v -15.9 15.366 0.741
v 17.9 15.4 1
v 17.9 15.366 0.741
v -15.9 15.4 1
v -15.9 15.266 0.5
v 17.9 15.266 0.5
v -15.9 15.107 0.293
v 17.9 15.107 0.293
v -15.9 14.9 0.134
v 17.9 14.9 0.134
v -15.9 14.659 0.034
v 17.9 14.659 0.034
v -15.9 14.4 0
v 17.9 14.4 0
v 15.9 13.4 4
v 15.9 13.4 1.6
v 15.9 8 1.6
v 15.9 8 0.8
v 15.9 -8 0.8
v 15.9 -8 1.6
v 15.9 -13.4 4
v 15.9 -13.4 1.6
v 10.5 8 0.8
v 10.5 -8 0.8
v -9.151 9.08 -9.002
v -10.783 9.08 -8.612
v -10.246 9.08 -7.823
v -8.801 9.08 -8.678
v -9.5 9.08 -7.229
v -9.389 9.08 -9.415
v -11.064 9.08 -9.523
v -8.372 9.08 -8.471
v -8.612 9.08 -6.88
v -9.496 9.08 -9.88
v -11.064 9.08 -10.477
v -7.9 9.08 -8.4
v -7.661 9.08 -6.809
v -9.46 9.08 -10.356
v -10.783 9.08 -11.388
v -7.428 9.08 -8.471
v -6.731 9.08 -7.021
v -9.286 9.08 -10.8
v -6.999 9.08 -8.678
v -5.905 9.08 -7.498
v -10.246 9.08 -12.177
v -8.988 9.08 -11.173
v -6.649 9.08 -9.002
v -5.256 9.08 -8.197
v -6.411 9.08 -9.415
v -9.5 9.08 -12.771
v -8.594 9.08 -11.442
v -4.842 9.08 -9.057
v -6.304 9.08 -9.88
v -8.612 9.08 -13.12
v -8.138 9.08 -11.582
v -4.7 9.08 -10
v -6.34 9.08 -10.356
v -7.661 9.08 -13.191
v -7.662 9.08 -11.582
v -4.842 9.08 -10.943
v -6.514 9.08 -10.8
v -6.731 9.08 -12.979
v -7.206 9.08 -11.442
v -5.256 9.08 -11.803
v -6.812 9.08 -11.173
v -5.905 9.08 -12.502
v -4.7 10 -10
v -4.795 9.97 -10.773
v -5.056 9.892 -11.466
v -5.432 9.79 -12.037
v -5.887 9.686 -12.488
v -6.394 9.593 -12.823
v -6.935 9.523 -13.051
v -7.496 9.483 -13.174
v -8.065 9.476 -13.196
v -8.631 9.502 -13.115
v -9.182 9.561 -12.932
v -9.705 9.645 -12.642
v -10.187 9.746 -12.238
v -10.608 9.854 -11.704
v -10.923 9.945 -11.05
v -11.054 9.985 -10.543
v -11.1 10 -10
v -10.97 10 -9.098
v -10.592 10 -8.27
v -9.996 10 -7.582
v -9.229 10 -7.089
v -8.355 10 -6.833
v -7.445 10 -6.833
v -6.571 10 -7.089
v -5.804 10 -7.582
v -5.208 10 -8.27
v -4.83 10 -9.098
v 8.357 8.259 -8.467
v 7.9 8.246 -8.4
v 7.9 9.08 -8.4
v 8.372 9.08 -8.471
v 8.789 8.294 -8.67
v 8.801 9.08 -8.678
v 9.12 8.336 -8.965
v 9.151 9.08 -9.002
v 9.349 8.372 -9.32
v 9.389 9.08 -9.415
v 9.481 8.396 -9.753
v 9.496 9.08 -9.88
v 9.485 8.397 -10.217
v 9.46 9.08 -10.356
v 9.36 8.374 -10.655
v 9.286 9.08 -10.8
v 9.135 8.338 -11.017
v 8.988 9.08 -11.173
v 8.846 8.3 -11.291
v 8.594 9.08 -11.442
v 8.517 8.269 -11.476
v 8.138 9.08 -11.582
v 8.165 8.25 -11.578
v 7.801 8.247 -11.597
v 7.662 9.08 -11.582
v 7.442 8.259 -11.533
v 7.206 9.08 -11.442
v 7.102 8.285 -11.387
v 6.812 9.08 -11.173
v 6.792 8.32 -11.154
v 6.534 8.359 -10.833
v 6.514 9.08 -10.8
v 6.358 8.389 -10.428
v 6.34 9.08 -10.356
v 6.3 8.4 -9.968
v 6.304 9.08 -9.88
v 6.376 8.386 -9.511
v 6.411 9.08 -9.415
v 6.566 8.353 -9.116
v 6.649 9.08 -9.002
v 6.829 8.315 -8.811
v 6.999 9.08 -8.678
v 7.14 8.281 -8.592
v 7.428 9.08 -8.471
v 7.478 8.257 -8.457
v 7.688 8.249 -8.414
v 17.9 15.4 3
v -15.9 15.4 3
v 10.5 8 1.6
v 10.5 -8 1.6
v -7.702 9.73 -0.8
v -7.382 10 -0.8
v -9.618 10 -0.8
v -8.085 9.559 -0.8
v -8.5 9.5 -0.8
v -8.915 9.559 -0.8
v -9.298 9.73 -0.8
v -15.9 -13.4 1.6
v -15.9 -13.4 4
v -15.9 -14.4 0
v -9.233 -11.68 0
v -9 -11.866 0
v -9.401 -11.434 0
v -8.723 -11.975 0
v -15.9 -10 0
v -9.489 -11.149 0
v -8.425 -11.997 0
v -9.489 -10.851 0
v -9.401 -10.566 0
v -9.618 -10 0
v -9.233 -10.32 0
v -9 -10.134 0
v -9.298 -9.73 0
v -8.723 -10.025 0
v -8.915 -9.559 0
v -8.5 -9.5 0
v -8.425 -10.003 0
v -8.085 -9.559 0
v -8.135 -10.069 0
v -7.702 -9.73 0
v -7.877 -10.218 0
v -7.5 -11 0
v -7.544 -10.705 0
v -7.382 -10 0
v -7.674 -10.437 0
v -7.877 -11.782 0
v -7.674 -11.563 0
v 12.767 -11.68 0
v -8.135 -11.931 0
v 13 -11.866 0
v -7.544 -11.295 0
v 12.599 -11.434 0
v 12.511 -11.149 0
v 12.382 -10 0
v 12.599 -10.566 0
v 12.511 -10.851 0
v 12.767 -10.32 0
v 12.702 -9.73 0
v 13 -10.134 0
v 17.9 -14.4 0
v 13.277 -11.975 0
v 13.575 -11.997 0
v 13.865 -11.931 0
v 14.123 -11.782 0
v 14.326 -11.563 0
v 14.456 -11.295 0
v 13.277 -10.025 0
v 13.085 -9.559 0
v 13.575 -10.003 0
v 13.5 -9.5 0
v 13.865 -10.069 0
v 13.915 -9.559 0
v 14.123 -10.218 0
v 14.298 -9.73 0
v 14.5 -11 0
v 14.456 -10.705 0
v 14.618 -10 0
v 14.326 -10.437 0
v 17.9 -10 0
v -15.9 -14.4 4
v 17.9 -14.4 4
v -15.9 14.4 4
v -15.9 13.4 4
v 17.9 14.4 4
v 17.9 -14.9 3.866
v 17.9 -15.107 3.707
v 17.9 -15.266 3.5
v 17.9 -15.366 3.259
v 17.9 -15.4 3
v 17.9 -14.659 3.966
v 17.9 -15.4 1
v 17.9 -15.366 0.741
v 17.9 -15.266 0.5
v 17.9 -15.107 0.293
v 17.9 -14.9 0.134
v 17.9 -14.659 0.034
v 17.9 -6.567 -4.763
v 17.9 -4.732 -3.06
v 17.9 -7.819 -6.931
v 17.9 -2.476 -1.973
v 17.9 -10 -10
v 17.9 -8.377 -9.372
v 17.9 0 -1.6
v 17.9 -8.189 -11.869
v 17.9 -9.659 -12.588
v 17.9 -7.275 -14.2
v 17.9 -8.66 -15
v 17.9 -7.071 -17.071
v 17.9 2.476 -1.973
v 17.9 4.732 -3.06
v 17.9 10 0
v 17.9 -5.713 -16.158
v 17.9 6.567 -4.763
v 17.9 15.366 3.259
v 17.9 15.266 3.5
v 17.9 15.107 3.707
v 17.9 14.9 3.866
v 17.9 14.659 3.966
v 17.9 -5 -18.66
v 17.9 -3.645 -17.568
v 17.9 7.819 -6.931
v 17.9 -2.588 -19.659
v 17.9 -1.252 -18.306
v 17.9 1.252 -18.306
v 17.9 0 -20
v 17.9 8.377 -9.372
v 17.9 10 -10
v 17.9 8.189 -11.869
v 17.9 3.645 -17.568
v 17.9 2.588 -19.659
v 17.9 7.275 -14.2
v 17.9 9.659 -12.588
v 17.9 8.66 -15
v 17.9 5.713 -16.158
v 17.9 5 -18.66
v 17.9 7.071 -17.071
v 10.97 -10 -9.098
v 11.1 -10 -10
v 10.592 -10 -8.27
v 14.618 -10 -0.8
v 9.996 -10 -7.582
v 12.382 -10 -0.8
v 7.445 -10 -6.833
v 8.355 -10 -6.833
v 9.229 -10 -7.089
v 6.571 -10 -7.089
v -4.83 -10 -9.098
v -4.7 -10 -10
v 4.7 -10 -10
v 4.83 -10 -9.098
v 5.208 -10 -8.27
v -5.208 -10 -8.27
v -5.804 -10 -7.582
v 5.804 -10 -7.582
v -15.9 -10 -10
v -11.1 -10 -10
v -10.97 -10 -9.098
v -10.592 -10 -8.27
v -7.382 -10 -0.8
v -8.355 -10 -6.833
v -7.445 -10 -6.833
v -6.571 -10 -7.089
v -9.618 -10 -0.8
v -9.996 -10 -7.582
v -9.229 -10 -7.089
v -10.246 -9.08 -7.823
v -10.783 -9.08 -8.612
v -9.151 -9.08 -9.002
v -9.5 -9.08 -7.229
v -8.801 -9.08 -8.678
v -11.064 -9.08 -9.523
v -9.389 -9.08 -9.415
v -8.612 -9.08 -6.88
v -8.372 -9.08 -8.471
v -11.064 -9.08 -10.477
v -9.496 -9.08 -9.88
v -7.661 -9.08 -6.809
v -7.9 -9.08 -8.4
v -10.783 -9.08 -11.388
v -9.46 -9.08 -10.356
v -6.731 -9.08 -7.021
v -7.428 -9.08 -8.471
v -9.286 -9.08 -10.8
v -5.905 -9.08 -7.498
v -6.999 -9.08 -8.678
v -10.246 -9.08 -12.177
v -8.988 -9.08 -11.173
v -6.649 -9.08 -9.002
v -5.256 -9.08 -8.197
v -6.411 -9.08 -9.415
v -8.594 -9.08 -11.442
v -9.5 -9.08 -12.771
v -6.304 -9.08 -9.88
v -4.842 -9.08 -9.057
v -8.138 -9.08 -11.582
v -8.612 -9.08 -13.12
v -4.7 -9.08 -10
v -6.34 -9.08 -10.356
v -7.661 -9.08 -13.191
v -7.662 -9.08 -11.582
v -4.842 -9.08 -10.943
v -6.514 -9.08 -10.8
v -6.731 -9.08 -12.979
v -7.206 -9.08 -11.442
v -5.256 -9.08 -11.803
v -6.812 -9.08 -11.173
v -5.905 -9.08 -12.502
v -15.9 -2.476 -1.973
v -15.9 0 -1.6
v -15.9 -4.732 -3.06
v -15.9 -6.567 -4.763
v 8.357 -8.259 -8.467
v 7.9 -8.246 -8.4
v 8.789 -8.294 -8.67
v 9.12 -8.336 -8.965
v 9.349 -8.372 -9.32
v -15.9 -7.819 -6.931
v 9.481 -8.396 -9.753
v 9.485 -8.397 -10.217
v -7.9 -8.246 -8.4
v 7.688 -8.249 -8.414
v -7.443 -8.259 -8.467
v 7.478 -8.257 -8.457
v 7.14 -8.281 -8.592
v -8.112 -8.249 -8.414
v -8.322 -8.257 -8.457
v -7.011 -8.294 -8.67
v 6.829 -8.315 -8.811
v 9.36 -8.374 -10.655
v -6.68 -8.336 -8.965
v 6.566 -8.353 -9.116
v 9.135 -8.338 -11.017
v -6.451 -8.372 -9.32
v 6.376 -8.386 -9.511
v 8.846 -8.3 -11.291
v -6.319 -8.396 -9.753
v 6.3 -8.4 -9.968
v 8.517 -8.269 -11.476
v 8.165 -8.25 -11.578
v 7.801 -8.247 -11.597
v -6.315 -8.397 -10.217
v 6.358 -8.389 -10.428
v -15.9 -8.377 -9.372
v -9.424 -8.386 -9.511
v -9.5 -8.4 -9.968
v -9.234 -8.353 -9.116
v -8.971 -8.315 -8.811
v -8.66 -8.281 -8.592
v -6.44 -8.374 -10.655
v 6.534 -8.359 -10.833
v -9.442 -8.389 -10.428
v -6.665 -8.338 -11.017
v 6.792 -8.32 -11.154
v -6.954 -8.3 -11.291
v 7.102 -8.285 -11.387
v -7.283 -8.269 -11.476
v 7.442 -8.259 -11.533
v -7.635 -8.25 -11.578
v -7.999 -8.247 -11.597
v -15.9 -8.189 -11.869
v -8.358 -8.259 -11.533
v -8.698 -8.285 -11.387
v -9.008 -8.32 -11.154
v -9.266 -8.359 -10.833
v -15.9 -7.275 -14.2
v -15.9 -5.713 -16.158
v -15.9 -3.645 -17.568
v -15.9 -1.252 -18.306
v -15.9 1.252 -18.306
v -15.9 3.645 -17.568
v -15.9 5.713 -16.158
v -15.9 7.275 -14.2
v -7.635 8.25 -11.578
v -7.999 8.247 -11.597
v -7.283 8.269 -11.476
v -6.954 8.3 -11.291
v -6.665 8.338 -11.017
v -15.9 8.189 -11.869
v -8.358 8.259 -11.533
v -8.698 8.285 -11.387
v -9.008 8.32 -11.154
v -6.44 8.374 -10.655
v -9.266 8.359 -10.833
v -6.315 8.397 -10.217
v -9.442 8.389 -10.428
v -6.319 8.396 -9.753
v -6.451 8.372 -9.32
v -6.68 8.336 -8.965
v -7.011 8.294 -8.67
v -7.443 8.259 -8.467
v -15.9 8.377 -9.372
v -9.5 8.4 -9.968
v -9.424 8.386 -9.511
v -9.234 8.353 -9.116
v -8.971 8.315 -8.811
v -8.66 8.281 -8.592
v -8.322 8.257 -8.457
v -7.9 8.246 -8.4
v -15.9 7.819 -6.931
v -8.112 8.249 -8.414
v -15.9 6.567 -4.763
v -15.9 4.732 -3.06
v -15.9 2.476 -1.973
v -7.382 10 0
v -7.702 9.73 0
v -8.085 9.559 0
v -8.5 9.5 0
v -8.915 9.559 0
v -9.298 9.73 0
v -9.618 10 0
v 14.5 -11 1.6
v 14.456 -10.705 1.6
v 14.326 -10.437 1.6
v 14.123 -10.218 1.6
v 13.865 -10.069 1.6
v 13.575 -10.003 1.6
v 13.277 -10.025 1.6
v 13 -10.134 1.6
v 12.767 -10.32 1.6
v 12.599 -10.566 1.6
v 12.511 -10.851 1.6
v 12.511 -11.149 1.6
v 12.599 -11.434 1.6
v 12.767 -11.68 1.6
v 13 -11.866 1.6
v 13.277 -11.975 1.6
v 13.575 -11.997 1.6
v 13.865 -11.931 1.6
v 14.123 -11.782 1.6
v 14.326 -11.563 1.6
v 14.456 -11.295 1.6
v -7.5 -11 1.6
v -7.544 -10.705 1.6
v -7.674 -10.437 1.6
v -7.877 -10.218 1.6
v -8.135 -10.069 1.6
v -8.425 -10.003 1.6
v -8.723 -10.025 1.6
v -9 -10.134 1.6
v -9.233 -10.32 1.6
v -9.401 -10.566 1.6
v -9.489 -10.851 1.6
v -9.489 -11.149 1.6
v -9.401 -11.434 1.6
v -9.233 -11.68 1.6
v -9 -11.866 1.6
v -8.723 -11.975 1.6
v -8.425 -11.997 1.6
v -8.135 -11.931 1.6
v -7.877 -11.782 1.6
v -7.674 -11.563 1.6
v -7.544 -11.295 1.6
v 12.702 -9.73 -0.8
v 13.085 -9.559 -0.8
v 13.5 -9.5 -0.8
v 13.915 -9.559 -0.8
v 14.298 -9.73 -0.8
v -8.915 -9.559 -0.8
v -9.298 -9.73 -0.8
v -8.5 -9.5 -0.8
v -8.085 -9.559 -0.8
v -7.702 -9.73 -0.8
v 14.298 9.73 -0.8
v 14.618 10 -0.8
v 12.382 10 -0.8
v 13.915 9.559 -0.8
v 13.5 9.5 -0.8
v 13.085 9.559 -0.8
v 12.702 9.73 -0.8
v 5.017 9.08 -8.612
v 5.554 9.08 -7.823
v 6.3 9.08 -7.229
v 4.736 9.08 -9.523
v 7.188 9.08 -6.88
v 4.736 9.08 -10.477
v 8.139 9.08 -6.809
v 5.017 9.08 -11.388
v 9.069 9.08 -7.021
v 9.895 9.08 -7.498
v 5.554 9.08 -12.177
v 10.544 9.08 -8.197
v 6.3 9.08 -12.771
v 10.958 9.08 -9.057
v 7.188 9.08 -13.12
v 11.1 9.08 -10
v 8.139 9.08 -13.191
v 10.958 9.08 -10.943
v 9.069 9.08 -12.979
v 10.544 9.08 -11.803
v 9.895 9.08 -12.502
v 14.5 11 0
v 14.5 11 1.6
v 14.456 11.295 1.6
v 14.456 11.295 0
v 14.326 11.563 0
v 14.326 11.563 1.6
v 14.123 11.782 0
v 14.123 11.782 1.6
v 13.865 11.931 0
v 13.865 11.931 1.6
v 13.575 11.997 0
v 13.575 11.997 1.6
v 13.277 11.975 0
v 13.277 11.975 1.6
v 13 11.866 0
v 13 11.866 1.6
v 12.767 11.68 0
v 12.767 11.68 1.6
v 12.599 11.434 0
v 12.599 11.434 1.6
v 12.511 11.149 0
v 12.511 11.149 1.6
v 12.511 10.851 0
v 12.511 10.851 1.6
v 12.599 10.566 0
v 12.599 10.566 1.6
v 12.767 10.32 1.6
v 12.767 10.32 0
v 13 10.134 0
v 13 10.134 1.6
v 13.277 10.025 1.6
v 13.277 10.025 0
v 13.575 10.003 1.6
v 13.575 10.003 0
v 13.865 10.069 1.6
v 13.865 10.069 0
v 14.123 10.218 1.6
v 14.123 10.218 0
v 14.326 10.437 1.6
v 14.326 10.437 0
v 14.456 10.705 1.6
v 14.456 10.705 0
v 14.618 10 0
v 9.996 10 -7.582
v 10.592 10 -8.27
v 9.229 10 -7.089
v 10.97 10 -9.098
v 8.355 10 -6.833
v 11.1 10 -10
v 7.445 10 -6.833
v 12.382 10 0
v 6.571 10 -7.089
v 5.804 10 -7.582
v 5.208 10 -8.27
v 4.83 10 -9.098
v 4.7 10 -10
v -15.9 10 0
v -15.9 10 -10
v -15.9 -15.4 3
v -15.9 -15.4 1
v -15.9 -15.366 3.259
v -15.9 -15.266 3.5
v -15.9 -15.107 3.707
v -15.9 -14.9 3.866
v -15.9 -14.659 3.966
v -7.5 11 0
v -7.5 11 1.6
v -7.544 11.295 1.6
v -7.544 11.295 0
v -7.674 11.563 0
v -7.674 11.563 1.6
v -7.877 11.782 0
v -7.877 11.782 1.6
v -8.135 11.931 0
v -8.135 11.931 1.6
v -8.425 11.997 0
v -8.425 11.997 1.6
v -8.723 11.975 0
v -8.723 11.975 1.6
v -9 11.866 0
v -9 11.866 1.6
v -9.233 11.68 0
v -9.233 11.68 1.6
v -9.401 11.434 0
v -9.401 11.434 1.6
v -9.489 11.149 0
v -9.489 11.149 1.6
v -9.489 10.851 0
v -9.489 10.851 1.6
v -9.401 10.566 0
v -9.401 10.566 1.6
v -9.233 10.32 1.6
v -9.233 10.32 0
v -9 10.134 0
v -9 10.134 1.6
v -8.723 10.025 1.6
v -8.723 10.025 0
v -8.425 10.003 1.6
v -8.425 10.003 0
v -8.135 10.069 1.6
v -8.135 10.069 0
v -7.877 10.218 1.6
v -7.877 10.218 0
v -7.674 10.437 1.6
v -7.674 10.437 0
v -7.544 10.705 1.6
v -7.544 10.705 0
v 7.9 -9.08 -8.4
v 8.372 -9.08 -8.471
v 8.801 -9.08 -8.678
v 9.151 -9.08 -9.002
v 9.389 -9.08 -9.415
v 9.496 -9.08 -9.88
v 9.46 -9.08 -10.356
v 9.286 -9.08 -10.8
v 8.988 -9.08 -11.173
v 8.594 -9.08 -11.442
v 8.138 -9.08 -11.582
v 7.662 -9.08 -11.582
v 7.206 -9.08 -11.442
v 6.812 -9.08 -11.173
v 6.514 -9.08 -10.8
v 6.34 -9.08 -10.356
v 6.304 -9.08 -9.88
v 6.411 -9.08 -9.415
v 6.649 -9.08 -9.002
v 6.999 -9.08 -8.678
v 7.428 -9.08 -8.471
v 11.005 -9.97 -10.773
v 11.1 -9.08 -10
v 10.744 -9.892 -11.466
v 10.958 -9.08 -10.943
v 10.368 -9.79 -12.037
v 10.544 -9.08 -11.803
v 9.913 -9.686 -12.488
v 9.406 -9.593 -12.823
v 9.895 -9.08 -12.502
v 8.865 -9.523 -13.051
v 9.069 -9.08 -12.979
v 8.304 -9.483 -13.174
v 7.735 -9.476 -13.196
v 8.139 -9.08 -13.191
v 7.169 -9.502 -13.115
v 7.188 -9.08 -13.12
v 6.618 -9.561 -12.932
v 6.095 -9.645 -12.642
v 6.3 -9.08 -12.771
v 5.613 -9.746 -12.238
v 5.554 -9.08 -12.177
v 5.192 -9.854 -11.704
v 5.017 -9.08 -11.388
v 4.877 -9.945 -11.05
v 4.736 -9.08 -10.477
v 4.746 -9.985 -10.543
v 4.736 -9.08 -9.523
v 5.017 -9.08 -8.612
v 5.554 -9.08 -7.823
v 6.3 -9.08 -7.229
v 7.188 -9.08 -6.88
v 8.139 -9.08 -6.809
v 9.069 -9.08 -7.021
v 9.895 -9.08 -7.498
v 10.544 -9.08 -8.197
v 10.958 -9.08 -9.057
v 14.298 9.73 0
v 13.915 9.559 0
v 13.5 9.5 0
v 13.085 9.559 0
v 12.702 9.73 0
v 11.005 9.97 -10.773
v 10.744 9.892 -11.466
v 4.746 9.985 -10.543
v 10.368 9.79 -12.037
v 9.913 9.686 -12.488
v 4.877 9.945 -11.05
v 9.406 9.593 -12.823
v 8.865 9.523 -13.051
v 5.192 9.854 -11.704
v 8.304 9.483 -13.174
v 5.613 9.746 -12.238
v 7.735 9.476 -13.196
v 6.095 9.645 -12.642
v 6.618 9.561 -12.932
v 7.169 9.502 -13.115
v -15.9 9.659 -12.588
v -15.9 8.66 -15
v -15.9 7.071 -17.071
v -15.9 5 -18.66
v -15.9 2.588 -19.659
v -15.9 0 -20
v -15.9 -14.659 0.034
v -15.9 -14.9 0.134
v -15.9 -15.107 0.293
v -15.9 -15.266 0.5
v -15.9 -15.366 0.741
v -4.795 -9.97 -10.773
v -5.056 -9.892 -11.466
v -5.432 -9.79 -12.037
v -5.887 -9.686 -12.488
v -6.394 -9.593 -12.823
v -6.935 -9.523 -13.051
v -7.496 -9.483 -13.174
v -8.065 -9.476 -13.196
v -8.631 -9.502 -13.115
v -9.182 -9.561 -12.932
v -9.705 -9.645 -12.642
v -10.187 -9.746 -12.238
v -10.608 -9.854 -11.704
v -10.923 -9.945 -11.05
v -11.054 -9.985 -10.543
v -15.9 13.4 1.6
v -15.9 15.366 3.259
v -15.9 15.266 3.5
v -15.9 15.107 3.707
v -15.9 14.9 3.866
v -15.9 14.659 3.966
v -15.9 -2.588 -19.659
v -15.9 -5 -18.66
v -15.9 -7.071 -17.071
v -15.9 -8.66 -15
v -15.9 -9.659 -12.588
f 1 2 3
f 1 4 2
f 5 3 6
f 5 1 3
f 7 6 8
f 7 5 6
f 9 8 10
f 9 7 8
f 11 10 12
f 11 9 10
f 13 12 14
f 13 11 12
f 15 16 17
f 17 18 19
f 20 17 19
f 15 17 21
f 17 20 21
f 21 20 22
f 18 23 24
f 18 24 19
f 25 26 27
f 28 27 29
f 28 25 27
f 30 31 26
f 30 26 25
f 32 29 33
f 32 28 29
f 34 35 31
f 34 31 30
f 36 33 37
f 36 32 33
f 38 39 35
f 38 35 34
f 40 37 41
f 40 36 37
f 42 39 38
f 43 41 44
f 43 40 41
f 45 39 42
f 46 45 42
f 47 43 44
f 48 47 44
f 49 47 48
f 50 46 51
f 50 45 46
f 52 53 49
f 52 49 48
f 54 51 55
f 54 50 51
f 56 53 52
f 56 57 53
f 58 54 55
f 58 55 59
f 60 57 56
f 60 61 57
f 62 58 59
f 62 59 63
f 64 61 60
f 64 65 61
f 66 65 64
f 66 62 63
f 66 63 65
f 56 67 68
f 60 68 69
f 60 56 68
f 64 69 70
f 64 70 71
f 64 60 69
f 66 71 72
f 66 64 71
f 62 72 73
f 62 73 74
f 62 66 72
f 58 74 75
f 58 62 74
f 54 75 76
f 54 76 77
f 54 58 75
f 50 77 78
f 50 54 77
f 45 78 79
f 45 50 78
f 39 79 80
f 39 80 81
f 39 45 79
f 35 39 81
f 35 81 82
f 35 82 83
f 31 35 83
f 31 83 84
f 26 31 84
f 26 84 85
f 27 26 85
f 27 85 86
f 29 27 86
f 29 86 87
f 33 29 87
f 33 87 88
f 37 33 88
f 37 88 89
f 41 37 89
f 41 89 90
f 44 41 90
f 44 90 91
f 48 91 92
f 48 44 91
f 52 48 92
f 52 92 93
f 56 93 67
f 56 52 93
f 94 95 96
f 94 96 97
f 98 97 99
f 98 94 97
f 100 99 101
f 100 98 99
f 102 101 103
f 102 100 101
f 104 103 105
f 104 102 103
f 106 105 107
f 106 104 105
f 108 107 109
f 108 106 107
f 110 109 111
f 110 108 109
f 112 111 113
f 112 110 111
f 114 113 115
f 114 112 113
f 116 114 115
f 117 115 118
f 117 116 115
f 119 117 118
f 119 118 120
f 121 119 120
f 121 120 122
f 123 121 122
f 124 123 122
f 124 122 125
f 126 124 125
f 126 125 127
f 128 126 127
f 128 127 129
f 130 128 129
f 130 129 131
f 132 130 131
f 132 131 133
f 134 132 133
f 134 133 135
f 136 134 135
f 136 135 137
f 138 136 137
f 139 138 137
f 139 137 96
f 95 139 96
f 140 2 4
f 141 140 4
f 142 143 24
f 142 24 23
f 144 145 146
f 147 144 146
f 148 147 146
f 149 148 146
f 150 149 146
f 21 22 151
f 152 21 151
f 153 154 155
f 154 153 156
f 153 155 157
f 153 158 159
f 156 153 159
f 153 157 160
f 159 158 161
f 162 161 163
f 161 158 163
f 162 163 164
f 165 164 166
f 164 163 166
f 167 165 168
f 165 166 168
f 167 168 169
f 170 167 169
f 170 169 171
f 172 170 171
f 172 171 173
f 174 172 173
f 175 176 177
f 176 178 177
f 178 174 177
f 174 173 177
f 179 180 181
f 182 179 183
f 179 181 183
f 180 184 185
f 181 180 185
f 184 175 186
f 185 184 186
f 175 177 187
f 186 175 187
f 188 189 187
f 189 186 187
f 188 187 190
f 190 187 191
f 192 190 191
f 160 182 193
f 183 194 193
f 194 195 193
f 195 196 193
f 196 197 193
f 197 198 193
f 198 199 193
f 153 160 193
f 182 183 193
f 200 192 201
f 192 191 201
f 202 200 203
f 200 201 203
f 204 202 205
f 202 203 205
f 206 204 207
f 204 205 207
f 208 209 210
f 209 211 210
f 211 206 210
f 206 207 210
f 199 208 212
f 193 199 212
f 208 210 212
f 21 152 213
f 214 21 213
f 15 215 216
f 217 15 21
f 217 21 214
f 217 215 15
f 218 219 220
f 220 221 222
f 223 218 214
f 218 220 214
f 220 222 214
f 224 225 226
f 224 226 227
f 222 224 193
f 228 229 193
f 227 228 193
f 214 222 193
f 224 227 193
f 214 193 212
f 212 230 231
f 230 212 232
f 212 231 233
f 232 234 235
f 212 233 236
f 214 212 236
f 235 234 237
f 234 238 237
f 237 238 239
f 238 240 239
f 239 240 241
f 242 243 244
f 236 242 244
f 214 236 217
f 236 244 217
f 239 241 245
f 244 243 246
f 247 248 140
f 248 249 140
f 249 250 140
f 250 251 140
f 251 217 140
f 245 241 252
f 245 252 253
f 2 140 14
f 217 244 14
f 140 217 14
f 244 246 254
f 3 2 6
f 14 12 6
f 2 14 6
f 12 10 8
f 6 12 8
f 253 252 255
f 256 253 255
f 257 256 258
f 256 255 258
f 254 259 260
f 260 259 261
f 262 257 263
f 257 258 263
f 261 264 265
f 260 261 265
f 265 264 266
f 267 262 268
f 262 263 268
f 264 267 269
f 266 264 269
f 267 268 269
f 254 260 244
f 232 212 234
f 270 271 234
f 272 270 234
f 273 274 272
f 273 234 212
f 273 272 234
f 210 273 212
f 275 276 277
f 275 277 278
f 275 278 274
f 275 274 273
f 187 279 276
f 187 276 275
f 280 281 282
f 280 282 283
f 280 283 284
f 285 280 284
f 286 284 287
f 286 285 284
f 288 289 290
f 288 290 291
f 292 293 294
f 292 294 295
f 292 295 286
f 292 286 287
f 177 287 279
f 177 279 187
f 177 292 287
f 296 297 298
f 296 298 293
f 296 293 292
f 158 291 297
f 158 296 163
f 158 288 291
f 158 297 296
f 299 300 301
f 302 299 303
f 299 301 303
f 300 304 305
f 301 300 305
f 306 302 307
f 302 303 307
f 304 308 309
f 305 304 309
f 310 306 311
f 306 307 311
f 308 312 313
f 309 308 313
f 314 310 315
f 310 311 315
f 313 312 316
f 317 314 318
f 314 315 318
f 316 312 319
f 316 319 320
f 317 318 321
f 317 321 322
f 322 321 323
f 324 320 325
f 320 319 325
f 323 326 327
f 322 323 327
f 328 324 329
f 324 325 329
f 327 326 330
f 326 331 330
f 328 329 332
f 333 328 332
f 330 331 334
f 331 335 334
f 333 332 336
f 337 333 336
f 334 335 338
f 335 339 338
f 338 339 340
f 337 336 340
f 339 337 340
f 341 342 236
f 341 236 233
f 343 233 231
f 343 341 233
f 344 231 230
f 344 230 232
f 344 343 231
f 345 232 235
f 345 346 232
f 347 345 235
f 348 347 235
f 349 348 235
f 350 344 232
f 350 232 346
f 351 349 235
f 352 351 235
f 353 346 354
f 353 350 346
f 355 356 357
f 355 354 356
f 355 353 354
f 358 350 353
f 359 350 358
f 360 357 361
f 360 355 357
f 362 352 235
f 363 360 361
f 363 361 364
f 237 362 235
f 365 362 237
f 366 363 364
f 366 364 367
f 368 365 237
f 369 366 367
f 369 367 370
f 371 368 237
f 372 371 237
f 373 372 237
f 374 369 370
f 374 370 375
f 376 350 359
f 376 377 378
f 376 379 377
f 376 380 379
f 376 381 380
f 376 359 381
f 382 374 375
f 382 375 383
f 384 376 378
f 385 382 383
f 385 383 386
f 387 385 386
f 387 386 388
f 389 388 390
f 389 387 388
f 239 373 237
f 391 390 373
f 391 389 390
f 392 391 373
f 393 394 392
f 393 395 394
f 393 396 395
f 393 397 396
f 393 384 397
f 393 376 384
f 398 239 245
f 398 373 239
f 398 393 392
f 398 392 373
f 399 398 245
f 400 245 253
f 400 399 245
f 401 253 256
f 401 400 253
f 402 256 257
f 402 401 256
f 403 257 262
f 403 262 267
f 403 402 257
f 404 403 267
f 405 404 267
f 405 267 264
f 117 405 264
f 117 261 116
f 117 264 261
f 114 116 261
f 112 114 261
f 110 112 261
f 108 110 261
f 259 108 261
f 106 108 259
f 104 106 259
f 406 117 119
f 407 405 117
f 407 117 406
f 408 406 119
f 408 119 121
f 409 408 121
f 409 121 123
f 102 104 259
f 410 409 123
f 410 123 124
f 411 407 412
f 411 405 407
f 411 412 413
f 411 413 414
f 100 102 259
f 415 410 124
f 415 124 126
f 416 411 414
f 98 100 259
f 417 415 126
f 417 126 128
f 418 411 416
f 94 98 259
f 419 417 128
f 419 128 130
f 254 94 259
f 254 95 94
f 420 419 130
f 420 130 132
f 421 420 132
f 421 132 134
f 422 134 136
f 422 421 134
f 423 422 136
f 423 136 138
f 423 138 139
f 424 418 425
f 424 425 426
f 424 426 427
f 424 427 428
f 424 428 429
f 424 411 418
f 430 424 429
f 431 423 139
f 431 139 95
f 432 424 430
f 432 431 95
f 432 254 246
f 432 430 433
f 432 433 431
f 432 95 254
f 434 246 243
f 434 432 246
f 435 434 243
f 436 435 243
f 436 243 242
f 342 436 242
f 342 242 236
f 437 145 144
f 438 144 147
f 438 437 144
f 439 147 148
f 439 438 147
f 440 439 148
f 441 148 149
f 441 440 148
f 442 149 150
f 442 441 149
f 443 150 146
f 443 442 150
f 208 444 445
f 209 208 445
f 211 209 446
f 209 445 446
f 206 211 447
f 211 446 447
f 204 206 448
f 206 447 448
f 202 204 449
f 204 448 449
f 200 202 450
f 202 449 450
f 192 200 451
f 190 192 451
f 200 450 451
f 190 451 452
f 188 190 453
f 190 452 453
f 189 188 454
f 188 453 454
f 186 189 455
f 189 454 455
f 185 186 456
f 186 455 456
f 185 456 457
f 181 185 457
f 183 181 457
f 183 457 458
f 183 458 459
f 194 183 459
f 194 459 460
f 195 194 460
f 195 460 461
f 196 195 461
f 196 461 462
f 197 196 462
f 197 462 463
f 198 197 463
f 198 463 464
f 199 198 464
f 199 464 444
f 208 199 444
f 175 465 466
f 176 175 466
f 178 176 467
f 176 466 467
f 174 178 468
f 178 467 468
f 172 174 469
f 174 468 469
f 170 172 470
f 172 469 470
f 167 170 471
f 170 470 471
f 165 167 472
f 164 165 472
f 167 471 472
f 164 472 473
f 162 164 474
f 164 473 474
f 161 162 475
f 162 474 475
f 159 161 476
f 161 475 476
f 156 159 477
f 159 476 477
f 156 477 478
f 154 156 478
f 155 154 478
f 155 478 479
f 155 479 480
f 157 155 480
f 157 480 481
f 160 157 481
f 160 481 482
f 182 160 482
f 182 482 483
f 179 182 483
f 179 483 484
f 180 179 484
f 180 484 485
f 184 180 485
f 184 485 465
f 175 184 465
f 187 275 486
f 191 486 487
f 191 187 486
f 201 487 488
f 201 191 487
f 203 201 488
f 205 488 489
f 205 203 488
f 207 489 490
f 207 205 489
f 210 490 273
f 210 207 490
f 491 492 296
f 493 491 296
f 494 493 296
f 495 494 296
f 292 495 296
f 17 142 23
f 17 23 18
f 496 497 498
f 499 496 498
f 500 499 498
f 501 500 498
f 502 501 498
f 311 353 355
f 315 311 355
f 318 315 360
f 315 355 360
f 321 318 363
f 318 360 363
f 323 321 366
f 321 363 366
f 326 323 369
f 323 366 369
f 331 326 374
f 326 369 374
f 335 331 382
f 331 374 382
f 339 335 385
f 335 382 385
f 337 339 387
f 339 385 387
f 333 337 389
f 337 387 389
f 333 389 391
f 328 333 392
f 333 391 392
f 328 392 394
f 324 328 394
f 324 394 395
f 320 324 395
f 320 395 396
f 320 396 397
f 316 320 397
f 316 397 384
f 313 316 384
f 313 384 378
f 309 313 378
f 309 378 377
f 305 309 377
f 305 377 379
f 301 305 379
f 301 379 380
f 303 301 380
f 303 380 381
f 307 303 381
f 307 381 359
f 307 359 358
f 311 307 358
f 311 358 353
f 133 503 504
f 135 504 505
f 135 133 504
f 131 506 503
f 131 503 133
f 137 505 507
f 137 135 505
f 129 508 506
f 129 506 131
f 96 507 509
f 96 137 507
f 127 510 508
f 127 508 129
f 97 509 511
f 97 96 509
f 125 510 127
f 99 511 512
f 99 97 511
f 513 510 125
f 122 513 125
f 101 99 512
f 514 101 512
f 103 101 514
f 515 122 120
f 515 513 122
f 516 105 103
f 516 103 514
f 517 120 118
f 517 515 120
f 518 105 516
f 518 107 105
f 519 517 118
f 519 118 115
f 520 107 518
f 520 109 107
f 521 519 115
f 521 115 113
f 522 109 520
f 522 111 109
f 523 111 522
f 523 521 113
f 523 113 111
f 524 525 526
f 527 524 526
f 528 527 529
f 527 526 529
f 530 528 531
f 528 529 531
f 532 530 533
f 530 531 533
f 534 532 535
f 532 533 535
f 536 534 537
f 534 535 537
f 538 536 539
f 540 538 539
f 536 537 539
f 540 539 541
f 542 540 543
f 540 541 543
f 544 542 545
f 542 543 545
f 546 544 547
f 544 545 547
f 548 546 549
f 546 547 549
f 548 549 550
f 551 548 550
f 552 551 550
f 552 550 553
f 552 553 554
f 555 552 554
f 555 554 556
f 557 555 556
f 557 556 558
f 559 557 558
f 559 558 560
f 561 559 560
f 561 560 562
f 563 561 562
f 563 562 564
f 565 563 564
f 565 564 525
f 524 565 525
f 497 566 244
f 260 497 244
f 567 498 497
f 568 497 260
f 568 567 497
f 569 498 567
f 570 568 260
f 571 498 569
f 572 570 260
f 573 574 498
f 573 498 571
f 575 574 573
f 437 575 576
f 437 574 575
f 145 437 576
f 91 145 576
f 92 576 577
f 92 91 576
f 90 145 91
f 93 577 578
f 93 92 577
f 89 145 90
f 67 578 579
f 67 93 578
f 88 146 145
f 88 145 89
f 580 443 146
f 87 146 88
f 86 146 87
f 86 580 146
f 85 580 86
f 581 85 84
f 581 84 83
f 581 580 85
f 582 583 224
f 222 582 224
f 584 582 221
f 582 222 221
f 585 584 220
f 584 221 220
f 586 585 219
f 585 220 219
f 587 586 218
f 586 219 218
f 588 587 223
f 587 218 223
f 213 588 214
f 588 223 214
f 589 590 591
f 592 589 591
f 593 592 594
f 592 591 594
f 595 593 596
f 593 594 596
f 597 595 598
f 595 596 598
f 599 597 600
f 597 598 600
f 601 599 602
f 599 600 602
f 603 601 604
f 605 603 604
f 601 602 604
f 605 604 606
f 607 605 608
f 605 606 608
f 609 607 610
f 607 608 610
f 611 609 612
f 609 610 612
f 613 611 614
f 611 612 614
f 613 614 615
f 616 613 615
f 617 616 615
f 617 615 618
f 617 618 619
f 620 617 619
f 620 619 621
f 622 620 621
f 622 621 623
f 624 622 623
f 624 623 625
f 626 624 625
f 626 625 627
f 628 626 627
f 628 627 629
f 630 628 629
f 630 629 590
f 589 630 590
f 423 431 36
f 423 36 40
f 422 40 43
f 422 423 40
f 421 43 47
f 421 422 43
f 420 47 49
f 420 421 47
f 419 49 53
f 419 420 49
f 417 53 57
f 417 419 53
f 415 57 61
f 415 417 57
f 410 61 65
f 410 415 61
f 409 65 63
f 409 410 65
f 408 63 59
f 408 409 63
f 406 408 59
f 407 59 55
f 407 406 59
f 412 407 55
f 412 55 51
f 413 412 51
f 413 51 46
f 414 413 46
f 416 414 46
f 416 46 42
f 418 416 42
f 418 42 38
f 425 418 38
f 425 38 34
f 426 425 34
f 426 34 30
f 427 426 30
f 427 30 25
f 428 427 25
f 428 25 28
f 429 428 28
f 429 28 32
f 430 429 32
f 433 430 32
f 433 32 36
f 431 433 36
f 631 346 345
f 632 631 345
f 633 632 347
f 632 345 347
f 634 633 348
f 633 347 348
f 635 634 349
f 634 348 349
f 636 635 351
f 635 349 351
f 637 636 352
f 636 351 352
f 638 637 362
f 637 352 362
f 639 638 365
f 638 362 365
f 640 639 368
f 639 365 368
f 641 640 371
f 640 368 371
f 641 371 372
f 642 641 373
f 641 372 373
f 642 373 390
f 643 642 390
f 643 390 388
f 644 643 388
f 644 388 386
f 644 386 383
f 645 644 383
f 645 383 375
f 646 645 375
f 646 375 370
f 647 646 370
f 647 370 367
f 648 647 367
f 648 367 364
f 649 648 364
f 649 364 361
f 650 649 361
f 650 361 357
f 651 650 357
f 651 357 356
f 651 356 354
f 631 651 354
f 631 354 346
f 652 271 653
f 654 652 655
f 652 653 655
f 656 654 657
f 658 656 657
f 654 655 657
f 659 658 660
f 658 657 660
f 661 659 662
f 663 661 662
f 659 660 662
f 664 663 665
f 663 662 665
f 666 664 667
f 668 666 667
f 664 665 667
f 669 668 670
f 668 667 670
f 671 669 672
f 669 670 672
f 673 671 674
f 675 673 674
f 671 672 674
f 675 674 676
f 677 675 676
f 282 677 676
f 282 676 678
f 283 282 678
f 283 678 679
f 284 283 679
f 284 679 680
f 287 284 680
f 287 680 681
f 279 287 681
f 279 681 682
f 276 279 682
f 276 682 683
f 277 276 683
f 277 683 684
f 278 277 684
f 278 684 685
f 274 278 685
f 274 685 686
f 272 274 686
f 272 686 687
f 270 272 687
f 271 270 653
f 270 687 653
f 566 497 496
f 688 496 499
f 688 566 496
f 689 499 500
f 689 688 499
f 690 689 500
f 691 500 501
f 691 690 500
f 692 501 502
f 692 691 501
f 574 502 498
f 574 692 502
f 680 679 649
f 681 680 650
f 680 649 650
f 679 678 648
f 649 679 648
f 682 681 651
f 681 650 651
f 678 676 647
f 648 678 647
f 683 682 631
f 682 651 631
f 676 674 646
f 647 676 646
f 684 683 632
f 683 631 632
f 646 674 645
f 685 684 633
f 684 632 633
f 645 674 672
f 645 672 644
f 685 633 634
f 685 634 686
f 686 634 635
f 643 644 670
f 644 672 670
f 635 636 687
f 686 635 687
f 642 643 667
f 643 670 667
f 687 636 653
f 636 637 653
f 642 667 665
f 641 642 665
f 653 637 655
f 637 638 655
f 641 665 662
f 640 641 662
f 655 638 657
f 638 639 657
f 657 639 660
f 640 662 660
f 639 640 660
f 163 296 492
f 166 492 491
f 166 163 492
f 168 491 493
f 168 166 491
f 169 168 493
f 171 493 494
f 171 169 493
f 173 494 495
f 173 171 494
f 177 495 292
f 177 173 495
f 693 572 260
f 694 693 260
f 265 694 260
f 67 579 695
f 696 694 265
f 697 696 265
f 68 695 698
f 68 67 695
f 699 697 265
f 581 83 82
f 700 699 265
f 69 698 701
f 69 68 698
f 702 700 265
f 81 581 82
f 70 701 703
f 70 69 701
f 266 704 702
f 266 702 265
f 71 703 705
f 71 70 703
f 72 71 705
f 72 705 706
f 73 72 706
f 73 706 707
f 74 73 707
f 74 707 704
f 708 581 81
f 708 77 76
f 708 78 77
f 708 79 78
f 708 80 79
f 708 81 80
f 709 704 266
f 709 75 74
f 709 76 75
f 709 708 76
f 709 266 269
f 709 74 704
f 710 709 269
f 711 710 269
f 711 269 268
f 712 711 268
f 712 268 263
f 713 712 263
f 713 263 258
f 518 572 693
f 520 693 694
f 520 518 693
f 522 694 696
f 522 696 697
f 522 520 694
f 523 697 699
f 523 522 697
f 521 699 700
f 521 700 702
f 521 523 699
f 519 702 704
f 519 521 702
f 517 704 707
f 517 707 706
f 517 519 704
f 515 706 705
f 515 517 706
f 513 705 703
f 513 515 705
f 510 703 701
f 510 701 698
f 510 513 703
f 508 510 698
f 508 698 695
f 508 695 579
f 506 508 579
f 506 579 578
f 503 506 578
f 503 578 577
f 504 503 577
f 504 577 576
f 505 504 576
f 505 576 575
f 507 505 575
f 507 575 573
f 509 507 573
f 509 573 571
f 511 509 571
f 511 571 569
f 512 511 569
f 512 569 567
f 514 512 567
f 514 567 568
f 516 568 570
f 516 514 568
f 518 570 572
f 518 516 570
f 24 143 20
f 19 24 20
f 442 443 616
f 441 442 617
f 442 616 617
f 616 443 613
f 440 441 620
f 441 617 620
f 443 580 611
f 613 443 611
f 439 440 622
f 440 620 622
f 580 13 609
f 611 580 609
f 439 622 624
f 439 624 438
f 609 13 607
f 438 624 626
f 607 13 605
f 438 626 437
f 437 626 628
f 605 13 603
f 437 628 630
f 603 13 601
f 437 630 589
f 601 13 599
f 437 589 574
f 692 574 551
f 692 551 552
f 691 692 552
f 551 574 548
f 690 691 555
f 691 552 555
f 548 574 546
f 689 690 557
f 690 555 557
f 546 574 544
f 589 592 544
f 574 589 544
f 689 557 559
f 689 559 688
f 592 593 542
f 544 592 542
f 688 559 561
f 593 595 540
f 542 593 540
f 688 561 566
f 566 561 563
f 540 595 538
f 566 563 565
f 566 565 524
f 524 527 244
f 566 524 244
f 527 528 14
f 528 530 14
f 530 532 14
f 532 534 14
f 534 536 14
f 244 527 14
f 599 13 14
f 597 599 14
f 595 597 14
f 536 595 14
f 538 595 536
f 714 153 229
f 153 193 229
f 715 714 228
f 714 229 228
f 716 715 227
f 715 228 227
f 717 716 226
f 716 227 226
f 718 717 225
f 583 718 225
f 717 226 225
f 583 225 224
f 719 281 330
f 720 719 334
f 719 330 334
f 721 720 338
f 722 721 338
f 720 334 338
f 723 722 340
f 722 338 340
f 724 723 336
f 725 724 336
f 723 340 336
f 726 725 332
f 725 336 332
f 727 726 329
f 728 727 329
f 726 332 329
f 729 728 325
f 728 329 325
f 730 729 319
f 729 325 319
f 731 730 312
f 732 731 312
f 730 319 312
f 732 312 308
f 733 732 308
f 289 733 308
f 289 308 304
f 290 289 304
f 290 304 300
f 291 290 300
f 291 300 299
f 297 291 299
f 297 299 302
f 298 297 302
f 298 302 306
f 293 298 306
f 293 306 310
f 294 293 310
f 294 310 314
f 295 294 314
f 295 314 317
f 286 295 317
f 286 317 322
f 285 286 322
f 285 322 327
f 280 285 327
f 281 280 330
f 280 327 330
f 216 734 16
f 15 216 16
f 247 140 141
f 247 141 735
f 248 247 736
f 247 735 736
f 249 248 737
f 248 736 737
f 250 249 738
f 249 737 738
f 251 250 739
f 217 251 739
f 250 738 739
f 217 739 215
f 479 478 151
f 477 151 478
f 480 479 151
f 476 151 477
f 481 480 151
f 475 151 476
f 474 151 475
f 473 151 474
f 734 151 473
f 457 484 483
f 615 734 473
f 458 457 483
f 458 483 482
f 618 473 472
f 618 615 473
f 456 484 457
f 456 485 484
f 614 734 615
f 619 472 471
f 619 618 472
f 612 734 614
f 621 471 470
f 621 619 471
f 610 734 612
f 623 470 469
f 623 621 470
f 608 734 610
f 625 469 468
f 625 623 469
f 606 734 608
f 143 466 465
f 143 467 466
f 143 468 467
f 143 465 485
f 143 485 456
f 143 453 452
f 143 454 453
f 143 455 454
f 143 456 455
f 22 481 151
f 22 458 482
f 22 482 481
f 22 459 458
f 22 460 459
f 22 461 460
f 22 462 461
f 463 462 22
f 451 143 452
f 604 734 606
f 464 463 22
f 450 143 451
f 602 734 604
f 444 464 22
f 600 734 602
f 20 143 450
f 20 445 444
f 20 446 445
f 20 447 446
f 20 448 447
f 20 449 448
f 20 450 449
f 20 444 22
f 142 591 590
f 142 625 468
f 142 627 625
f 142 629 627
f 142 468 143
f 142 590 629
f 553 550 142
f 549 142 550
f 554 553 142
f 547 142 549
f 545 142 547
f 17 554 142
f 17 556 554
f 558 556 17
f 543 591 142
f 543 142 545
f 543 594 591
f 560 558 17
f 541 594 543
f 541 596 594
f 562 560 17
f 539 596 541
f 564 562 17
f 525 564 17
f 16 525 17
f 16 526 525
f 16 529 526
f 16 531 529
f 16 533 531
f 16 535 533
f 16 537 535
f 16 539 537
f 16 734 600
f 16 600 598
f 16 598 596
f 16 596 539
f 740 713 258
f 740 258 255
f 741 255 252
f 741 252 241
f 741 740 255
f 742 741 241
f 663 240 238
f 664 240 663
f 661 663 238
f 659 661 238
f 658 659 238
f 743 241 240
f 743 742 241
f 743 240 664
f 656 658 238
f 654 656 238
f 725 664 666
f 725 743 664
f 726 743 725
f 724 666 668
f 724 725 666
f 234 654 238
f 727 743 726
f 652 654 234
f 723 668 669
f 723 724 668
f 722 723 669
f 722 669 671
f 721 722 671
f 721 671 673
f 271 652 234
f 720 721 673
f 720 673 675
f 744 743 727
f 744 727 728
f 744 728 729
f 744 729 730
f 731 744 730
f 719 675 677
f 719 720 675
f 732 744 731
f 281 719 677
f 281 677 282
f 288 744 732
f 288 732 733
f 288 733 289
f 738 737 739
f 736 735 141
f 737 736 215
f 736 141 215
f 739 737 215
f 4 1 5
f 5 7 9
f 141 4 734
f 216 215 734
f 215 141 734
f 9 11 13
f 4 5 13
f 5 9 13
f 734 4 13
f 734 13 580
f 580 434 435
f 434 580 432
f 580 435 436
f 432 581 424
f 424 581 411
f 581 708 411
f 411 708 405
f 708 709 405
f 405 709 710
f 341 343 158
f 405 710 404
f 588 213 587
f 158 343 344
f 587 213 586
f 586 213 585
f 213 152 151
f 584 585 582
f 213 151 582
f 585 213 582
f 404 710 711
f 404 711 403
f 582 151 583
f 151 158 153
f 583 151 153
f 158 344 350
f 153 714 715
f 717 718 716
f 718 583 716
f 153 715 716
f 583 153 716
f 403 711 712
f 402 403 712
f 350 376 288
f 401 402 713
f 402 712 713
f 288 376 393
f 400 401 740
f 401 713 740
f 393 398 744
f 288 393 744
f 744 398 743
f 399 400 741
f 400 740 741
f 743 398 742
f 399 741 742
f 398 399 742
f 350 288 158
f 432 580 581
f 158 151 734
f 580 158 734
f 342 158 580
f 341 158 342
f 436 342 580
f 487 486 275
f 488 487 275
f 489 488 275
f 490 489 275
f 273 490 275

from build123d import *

# Parameters (mm, degrees)
SKETCH_1_W               = 31.8
SKETCH_1_H               = 26.8
SKETCH_1_R               = 1
EXTRUDE_1_DEPTH          = 1.6
EXTRUDE_2_DEPTH          = 4
SKETCH_2_W               = 5.4
SKETCH_2_H               = 16
CUT_EXTRUDE_1_DEPTH      = 0.8
EXTRUDE_3_DEPTH          = 33.8
SKETCH_4_R               = 1.6
CUT_EXTRUDE_2_DEPTH      = 31.944627967
CUT_EXTRUDE_2_DEPTH_BACK = 31.944627967
CUT_EXTRUDE_START        = -1
SKETCH_6_R               = 3.2
SKETCH_6_R_2             = 1.6
CUT_EXTRUDE_3_DEPTH      = 3
CUT_EXTRUDE_START_2      = 1.6
SKETCH_1_5_R             = 1
CUT_EXTRUDE_5_DEPTH      = 33.544628089
FILLET_1_R               = 1
SKETCH_7_R               = 1.5
SKETCH_7_R_2             = 1
CUT_EXTRUDE_6_DEPTH      = 0.8


with BuildPart() as part:
    # Эскиз1 → Бобышка-Вытянуть1 (new body)
    with BuildSketch(Plane.XY):
        Rectangle(SKETCH_1_W, SKETCH_1_H)
        with Locations((-8.5, -11)):
            Circle(SKETCH_1_R, mode=Mode.SUBTRACT)
        with Locations((-8.5, 11)):
            Circle(SKETCH_1_R, mode=Mode.SUBTRACT)
        with Locations((13.5, 11)):
            Circle(SKETCH_1_R, mode=Mode.SUBTRACT)
        with Locations((13.5, -11)):
            Circle(SKETCH_1_R, mode=Mode.SUBTRACT)
        with Locations((-8.5, 11)):
            Circle(SKETCH_1_R)
        with Locations((13.5, 11)):
            Circle(SKETCH_1_R)
        with Locations((-8.5, -11)):
            Circle(SKETCH_1_R)
        with Locations((13.5, -11)):
            Circle(SKETCH_1_R)
    extrude(amount=EXTRUDE_1_DEPTH)

    # Эскиз1<3> → Бобышка-Вытянуть2 (add)
    with BuildSketch(Plane.XY):
        Polygon((-15.9, -13.4), (-15.9, -15.4), (17.9, -15.4), (17.9, 15.4), (-15.9, 15.4), (-15.9, 13.4), (15.9, 13.4), (15.9, -13.4), align=None)
    extrude(amount=EXTRUDE_2_DEPTH)

    # Эскиз2 → Вырез-Вытянуть1 (cut)
    with BuildSketch(Plane.XY.offset(1.6)):
        with Locations((13.2, 0)):
            Rectangle(SKETCH_2_W, SKETCH_2_H)
    extrude(amount=-CUT_EXTRUDE_1_DEPTH, mode=Mode.SUBTRACT)

    # Эскиз3 → Бобышка-Вытянуть3 (add)
    with BuildSketch(Plane.ZY.offset(15.9)):
        with BuildLine():
            Line((-1.6, 0), (0, 0))
            ThreePointArc((0, 0), (-2.928932188, 7.071067812), (-10, 10))
            ThreePointArc((-10, 10), (-17.071067812, 7.071067812), (-20, 0))
            Line((-20, 0), (-18.4, 0))
            ThreePointArc((-18.4, 0), (-10, 8.4), (-1.6, 0))
        make_face()
        with BuildLine():
            ThreePointArc((-10, -10), (-2.928932188, -7.071067812), (0, 0))
            Line((0, 0), (-1.6, 0))
            ThreePointArc((-1.6, 0), (-10, -8.4), (-18.4, 0))
            Line((-18.4, 0), (-20, 0))
            ThreePointArc((-20, 0), (-17.071067812, -7.071067812), (-10, -10))
        make_face()
        with BuildLine():
            Line((0, -10), (0, 0))
            ThreePointArc((0, 0), (-2.928932188, -7.071067812), (-10, -10))
            Line((-10, -10), (0, -10))
        make_face()
        with BuildLine():
            ThreePointArc((-10, 10), (-2.928932188, 7.071067812), (0, 0))
            Line((0, 0), (0, 10))
            Line((0, 10), (-10, 10))
        make_face()
    extrude(amount=-EXTRUDE_3_DEPTH)

    # Эскиз4 → Вырез-Вытянуть2 (cut, two sides)
    with BuildSketch(Plane(origin=(0, 0, 0), x_dir=(1, 0, 0), z_dir=(0, 1, 0))) as cut_extrude_2_sk:
        with Locations(Location((-7.9, 10, 0), (0, 0, 270))):
            Circle(SKETCH_4_R)
        with Locations(Location((7.9, 10, 0), (0, 0, 270))):
            Circle(SKETCH_4_R)
    extrude(amount=CUT_EXTRUDE_2_DEPTH, mode=Mode.SUBTRACT)
    extrude(cut_extrude_2_sk.sketch, amount=-CUT_EXTRUDE_2_DEPTH_BACK, mode=Mode.SUBTRACT)

    # Эскиз6 → Вырез-Вытянуть3 (cut)
    with BuildSketch(Plane(origin=(0, 10.08, 0), x_dir=(1, 0, 0), z_dir=(0, 1, 0)).offset(CUT_EXTRUDE_START)):
        with Locations((7.9, 10)):
            Circle(SKETCH_6_R)
        with Locations(Location((7.9, 10, 0), (0, 0, 270))):
            Circle(SKETCH_6_R_2, mode=Mode.SUBTRACT)
        with Locations((-7.9, 10)):
            Circle(SKETCH_6_R)
        with Locations(Location((-7.9, 10, 0), (0, 0, 270))):
            Circle(SKETCH_6_R_2, mode=Mode.SUBTRACT)
    cut_extrude_3 = extrude(amount=CUT_EXTRUDE_3_DEPTH, mode=Mode.SUBTRACT)

    # Зеркальное отражение1: Вырез-Вытянуть3 across plane
    add(cut_extrude_3.mirror(Plane.ZX), mode=Mode.SUBTRACT)

    # Эскиз1<5> → Вырез-Вытянуть5 (cut, through all)
    with BuildSketch(Plane.XY.offset(CUT_EXTRUDE_START_2)):
        with Locations((13.5, 11)):
            Circle(SKETCH_1_5_R)
        with Locations((-8.5, 11)):
            Circle(SKETCH_1_5_R)
        with Locations((-8.5, -11)):
            Circle(SKETCH_1_5_R)
        with Locations((13.5, -11)):
            Circle(SKETCH_1_5_R)
    extrude(amount=-CUT_EXTRUDE_5_DEPTH, mode=Mode.SUBTRACT)

    # Скругление1
    fillet_1_edges = [part.edges().sort_by_distance(p)[0] for p in [
        (1, -15.4, 0),
        (1, 15.4, 4),
        (1, -15.4, 4),
        (1, 15.4, 0),
    ]]
    fillet(fillet_1_edges, radius=FILLET_1_R)

    # Эскиз7 → Вырез-Вытянуть6 (cut)
    with BuildSketch(Plane(origin=(0, 0, 0), x_dir=(-1, 0, 0), z_dir=(0, 0, -1))):
        with Locations((8.5, 11)):
            Circle(SKETCH_7_R)
        with Locations(Location((8.5, 11, 0), (0, 0, 180))):
            Circle(SKETCH_7_R_2, mode=Mode.SUBTRACT)
        with Locations((-13.5, 11)):
            Circle(SKETCH_7_R)
        with Locations(Location((-13.5, 11, 0), (0, 0, 180))):
            Circle(SKETCH_7_R_2, mode=Mode.SUBTRACT)
        with Locations((8.5, -11)):
            Circle(SKETCH_7_R)
        with Locations(Location((8.5, -11, 0), (0, 0, 180))):
            Circle(SKETCH_7_R_2, mode=Mode.SUBTRACT)
        with Locations((-13.5, -11)):
            Circle(SKETCH_7_R)
        with Locations(Location((-13.5, -11, 0), (0, 0, 180))):
            Circle(SKETCH_7_R_2, mode=Mode.SUBTRACT)
    extrude(amount=CUT_EXTRUDE_6_DEPTH, mode=Mode.SUBTRACT)


solid = part.part
